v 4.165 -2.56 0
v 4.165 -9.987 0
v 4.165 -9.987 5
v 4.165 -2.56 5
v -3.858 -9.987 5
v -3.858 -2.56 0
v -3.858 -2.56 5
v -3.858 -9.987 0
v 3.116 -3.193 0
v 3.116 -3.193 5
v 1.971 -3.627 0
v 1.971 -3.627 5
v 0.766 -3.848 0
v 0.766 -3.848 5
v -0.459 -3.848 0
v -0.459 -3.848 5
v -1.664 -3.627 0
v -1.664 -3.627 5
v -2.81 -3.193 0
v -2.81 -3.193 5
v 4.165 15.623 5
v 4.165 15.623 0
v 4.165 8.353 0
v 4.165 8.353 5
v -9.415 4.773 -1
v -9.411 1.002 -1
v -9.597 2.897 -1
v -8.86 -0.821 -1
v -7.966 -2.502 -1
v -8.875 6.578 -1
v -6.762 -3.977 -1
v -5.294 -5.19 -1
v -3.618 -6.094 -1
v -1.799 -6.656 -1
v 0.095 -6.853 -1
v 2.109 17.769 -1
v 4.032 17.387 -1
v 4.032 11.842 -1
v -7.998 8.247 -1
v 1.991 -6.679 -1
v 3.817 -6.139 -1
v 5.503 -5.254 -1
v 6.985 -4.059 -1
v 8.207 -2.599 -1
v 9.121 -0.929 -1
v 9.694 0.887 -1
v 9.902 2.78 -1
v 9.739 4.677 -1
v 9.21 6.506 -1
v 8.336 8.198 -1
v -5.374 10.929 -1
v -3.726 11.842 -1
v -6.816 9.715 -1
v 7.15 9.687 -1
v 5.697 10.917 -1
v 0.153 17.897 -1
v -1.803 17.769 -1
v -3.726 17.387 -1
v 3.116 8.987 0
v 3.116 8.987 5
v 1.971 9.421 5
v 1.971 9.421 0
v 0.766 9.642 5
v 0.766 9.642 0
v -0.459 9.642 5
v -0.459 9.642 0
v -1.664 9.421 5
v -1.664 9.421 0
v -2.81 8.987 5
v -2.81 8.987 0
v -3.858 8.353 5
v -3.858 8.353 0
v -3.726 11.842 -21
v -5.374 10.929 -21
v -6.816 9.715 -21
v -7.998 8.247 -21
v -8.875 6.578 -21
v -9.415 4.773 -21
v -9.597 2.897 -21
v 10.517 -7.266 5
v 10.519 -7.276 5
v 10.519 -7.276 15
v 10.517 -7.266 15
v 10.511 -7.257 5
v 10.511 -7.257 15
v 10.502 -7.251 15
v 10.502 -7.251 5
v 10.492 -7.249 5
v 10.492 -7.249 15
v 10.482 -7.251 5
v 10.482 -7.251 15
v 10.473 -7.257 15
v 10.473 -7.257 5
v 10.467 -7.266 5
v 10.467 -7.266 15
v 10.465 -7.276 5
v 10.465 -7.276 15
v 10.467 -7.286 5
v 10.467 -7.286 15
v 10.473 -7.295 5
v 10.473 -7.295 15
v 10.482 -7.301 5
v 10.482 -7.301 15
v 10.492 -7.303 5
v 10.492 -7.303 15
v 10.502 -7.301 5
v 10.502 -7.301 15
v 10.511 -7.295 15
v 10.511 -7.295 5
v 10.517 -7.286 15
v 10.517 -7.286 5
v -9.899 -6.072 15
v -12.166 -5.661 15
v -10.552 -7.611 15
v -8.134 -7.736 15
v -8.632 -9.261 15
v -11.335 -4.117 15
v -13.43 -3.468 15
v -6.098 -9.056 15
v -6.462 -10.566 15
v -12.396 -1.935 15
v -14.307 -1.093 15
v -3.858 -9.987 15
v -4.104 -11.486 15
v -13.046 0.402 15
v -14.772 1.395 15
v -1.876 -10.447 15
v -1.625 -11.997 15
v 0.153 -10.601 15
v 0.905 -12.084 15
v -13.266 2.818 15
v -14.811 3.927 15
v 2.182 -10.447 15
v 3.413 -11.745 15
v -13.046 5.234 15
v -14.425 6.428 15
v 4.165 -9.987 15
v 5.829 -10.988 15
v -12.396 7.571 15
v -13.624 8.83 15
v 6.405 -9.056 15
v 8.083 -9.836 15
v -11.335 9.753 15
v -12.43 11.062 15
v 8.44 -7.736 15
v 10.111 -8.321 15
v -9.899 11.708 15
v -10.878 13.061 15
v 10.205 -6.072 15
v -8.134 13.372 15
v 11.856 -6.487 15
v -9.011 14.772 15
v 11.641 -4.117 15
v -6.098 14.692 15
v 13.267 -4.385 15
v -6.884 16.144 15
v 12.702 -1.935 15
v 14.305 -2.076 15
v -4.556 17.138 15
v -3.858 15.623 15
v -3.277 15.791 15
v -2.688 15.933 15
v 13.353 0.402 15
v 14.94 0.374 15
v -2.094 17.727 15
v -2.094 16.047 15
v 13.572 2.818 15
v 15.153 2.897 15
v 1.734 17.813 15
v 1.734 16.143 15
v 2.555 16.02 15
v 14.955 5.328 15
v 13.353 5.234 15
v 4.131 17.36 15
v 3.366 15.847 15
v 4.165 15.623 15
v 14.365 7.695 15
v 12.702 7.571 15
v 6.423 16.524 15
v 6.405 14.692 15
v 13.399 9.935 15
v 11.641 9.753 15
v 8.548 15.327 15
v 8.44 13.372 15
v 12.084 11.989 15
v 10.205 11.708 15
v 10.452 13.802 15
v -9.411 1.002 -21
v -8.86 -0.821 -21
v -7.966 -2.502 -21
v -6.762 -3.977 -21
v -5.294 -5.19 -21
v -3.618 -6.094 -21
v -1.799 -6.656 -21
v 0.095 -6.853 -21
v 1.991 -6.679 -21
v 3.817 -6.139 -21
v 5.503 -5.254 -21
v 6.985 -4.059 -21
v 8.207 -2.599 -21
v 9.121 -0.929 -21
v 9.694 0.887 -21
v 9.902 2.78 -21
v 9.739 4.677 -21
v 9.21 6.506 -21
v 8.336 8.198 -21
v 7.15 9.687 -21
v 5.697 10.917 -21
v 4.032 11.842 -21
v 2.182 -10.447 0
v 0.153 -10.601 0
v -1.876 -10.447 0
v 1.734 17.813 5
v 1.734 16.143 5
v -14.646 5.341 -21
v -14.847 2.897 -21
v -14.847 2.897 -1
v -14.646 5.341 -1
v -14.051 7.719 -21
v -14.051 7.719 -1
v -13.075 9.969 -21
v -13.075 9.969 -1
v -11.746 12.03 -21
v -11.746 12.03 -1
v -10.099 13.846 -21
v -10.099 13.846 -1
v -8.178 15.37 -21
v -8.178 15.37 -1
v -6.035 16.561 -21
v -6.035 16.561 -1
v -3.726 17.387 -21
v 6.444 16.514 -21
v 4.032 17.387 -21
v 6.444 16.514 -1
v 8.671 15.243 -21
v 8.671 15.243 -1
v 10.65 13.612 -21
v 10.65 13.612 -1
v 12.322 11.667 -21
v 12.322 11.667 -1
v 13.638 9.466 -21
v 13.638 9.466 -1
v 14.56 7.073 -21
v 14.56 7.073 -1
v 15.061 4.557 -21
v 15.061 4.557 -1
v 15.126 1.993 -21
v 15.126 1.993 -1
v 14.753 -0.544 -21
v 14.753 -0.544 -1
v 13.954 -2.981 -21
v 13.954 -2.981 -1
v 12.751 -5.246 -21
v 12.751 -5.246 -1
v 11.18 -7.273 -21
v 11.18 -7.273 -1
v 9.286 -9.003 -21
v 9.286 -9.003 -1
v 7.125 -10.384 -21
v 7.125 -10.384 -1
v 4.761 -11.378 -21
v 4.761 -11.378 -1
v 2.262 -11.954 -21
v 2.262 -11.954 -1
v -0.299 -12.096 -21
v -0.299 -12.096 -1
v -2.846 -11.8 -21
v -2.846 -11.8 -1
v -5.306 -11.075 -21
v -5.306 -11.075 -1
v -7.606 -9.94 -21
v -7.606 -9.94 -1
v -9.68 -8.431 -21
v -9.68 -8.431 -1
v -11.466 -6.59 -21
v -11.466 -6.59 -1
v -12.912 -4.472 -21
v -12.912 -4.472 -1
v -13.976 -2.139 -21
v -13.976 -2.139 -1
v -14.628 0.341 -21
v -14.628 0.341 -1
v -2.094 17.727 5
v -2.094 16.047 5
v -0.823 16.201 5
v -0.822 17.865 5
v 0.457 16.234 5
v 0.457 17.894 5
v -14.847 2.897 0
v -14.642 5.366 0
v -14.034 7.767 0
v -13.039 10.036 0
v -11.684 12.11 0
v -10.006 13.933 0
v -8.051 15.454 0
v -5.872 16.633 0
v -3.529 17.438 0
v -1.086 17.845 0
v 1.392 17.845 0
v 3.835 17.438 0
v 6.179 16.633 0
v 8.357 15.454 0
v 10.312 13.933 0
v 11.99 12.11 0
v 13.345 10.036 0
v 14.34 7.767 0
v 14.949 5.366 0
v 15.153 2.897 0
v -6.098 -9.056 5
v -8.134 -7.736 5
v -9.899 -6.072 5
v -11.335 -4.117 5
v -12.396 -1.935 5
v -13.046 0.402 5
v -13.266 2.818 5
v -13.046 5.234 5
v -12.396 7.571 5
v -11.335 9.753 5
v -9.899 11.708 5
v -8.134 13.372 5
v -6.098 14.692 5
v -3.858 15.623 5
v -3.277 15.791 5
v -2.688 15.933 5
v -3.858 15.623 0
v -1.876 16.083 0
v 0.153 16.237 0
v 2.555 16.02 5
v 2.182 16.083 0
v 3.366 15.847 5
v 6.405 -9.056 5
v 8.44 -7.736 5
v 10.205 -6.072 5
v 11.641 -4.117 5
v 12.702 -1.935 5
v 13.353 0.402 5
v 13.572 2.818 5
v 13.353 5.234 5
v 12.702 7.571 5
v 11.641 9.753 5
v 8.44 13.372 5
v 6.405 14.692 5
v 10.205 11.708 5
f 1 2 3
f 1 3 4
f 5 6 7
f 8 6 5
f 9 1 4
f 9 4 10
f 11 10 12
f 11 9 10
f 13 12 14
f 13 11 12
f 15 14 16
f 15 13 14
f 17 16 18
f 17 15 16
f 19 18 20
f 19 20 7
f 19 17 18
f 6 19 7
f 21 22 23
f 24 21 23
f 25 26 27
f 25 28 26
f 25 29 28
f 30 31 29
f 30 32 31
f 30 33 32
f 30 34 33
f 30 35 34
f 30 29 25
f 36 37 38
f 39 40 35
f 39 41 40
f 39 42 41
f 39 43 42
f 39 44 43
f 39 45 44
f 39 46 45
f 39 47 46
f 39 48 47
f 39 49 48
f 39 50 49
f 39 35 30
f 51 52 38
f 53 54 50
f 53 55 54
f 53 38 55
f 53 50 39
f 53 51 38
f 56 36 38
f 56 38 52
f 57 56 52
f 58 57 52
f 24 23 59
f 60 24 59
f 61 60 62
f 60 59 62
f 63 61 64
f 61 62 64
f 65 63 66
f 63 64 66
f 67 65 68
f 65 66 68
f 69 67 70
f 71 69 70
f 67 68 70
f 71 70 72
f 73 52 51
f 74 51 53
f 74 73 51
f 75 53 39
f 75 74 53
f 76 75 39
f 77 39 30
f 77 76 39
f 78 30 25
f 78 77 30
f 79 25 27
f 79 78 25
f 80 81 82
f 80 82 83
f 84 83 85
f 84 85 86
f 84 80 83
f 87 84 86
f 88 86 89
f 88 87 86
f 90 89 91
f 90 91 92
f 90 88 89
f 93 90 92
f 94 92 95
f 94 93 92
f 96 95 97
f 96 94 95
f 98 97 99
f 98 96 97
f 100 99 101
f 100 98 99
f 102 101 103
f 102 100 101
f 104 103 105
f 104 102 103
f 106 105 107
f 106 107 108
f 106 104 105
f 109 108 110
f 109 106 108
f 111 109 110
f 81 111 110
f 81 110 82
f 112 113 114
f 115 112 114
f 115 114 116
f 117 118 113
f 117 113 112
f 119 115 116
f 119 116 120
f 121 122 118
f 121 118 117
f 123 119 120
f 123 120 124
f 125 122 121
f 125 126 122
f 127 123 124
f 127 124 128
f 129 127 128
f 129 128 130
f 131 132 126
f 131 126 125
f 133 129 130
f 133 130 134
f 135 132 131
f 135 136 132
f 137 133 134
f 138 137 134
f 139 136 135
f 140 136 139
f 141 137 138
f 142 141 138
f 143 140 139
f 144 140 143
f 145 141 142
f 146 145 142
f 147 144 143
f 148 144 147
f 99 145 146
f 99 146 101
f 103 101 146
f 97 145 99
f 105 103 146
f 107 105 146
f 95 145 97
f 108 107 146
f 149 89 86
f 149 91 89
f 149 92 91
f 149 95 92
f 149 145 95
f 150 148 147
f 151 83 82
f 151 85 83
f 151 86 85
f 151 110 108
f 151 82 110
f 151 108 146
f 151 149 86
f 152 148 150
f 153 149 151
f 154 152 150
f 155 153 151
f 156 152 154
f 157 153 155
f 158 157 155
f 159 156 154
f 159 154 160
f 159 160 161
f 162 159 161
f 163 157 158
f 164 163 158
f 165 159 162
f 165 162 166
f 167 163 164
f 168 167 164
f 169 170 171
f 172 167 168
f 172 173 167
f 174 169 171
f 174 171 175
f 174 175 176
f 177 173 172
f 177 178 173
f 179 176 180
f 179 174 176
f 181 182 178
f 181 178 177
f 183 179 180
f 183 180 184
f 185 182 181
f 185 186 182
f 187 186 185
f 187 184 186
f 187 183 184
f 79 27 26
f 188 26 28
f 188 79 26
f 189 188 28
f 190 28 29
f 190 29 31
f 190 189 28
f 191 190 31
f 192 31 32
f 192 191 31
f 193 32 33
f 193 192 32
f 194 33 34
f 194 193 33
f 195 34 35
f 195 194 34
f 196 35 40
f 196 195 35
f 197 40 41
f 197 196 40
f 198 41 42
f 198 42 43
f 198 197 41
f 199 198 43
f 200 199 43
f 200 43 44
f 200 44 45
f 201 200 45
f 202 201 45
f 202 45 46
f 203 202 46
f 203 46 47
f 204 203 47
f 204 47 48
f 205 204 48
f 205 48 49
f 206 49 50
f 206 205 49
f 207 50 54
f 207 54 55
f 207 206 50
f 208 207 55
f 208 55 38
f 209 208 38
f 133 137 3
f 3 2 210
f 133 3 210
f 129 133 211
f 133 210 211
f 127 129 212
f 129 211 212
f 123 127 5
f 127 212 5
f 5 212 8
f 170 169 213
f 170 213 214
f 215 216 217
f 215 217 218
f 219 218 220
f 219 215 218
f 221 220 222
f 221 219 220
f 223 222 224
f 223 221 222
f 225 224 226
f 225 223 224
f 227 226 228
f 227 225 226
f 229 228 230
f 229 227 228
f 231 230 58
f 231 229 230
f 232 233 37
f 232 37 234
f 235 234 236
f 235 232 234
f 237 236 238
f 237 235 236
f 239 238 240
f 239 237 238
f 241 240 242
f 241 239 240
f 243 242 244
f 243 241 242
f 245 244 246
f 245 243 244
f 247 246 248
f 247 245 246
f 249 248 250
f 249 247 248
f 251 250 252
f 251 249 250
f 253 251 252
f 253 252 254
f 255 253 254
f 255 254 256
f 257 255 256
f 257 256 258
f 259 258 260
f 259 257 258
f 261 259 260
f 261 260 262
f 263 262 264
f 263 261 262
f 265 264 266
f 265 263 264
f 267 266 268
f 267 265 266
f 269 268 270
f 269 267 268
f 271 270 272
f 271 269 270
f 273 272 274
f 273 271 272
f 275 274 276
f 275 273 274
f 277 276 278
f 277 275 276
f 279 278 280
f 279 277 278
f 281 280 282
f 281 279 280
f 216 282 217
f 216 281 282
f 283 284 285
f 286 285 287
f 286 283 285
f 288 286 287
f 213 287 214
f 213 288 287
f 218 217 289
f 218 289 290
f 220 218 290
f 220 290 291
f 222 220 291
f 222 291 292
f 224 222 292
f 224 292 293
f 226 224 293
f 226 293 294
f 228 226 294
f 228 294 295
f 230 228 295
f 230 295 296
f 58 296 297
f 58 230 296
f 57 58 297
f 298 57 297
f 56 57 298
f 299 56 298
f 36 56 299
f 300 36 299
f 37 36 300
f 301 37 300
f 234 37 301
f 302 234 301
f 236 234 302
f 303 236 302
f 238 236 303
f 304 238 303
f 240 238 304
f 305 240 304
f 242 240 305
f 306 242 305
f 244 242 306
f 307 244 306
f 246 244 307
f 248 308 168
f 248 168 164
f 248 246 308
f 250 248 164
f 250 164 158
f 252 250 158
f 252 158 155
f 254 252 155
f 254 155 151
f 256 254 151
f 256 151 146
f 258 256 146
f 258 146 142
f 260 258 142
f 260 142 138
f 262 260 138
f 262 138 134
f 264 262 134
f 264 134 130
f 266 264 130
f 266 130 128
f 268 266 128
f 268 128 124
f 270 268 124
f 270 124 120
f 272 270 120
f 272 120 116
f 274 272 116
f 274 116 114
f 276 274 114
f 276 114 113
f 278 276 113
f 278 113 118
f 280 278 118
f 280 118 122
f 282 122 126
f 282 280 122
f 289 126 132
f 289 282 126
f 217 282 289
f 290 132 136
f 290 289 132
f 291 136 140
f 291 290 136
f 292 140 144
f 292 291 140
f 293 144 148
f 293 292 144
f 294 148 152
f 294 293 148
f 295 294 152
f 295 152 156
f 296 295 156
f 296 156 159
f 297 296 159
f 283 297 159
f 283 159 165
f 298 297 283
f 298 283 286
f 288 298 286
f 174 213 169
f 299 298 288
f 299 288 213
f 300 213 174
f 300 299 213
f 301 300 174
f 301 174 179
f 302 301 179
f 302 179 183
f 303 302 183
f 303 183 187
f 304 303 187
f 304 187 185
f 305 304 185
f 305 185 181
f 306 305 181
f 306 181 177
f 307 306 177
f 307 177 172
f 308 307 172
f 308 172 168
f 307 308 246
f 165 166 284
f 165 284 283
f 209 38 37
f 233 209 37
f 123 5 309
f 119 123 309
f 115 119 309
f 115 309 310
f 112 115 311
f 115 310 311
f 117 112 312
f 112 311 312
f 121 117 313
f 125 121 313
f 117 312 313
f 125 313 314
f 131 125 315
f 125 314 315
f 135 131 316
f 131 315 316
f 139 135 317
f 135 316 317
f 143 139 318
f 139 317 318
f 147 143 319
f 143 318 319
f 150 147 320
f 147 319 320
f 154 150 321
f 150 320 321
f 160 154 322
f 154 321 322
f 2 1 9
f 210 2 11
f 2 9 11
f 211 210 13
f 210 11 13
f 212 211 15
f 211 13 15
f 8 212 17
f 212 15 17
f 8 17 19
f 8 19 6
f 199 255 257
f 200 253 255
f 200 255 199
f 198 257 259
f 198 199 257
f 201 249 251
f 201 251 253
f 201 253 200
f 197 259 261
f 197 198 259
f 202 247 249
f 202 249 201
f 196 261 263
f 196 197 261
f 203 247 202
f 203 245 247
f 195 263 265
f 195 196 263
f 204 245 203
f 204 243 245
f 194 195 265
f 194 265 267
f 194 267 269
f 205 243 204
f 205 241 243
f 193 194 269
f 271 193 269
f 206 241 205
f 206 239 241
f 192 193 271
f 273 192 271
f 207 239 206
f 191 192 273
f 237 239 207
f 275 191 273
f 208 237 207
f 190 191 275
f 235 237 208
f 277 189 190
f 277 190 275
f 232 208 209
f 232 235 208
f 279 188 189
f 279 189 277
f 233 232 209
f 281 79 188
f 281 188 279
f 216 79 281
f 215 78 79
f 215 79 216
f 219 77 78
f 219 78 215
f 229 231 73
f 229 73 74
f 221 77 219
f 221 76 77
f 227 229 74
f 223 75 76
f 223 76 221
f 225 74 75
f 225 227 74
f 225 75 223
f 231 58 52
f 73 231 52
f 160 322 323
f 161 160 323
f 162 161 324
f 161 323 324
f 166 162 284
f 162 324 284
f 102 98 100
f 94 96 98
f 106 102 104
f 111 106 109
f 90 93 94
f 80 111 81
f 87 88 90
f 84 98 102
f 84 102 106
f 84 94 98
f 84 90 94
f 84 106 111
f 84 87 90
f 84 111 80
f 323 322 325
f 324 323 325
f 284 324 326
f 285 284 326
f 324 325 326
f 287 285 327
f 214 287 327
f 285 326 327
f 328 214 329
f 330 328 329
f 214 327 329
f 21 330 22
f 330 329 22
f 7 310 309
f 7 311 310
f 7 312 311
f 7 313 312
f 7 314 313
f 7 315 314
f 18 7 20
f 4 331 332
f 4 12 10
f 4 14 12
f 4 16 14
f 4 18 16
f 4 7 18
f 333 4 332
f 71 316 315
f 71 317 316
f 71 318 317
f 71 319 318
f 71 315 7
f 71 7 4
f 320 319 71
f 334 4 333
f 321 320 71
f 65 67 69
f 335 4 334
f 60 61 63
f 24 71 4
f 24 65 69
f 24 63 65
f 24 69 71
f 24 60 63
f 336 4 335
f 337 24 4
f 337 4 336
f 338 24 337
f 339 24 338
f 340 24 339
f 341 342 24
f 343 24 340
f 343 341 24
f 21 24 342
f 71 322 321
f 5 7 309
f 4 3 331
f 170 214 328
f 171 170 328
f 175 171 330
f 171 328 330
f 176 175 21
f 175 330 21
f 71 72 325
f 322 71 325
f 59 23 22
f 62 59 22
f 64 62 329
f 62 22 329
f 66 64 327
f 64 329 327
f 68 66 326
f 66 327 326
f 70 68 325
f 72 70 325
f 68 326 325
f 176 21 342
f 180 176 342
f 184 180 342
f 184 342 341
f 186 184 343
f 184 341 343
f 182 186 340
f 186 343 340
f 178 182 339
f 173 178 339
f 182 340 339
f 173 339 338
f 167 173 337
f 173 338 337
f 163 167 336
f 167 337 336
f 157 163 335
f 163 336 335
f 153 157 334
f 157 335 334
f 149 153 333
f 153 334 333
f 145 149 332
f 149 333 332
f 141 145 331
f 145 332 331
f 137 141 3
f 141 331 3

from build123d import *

# Parameters (mm, degrees)
SKETCH1_R            = 15
BOSS_EXTRUDE2_DEPTH  = 5
SKETCH10_R           = 0.026716532
BOSS_EXTRUDE10_DEPTH = 10
BOSS_EXTRUDE13_START = 1
SKETCH12_R           = 15
BOSS_EXTRUDE13_DEPTH = 1
BOSS_EXTRUDE14_START = 20
BOSS_EXTRUDE14_DEPTH = 20


with BuildPart() as part:
    # Sketch1 → Boss-Extrude2 (new body)
    with BuildSketch(Plane.XY):
        with Locations((0.153154005, 2.896729922)):
            Circle(SKETCH1_R)
        with BuildLine():
            Line((-3.858366409, 8.353410796), (-3.858366409, 15.623324251))
            ThreePointArc((-3.858366409, 15.623324251), (0.153154005, 16.236968805), (4.164674419, 15.623324251))
            Line((4.164674419, 15.623324251), (4.164674419, 8.353410796))
            ThreePointArc((4.164674419, 8.353410796), (0.153154005, 9.669296806), (-3.858366409, 8.353410796))
        make_face(mode=Mode.SUBTRACT)
        with BuildLine():
            Line((-3.858366409, -2.559950952), (-3.858366409, -9.987163584))
            ThreePointArc((-3.858366409, -9.987163584), (0.153154005, -10.600808139), (4.164674419, -9.987163584))
            Line((4.164674419, -9.987163584), (4.164674419, -2.559950952))
            ThreePointArc((4.164674419, -2.559950952), (0.153154005, -3.875836962), (-3.858366409, -2.559950952))
        make_face(mode=Mode.SUBTRACT)
    extrude(amount=BOSS_EXTRUDE2_DEPTH)

    # Sketch10 → Boss-Extrude10 (add)
    with BuildSketch(Plane.XY.offset(5)):
        with BuildLine():
            Line((-2.094128576, 16.047452534), (-2.094128576, 17.727431895))
            ThreePointArc((-2.094128576, 17.727431895), (-9.62669163, -8.476687302), (15.153154005, 2.896729922))
            ThreePointArc((15.153154005, 2.896729922), (11.304753393, 12.928770148), (1.734243192, 17.813169074))
            Line((1.734243192, 17.813169074), (1.734243192, 16.14349683))
            ThreePointArc((1.734243192, 16.14349683), (2.961528164, 15.939802873), (4.164674419, 15.623324251))
            ThreePointArc((4.164674419, 15.623324251), (13.572042477, 2.818080333), (4.164674419, -9.987163584))
            ThreePointArc((4.164674419, -9.987163584), (0.153154005, -10.600808139), (-3.858366409, -9.987163584))
            ThreePointArc((-3.858366409, -9.987163584), (-13.265734467, 2.818080333), (-3.858366409, 15.623324251))
            ThreePointArc((-3.858366409, 15.623324251), (-2.983424534, 15.865242588), (-2.094128576, 16.047452534))
        make_face()
        with Locations((10.491847297, -7.276178058)):
            Circle(SKETCH10_R, mode=Mode.SUBTRACT)
    extrude(amount=BOSS_EXTRUDE10_DEPTH)

    # Sketch12 → Boss-Extrude13 (add)
    with BuildSketch(Plane(origin=(0, 0, 0), x_dir=(-1, 0, 0), z_dir=(0, 0, -1)).offset(BOSS_EXTRUDE13_START)):
        with Locations((-0.153154005, 2.896729922)):
            Circle(SKETCH12_R)
    extrude(amount=-BOSS_EXTRUDE13_DEPTH)

    # Sketch13 → Boss-Extrude14 (add)
    with BuildSketch(Plane(origin=(0, 0, -1), x_dir=(-1, 0, 0), z_dir=(0, 0, -1)).offset(BOSS_EXTRUDE14_START)):
        with BuildLine():
            ThreePointArc((9.596845995, 2.896729922), (-5.50307382, -5.254396256), (-4.032047949, 11.841934323))
            Line((-4.032047949, 11.841934323), (-4.032047949, 17.386525703))
            ThreePointArc((-4.032047949, 17.386525703), (-9.285968216, -9.002501338), (14.846845995, 2.896729922))
            ThreePointArc((14.846845995, 2.896729922), (11.746077255, 12.029544133), (3.725739939, 17.386525703))
            Line((3.725739939, 17.386525703), (3.725739939, 11.841934323))
            ThreePointArc((3.725739939, 11.841934323), (7.997972173, 8.246649737), (9.596845995, 2.896729922))
        make_face()
    extrude(amount=-BOSS_EXTRUDE14_DEPTH)


solid = part.part
